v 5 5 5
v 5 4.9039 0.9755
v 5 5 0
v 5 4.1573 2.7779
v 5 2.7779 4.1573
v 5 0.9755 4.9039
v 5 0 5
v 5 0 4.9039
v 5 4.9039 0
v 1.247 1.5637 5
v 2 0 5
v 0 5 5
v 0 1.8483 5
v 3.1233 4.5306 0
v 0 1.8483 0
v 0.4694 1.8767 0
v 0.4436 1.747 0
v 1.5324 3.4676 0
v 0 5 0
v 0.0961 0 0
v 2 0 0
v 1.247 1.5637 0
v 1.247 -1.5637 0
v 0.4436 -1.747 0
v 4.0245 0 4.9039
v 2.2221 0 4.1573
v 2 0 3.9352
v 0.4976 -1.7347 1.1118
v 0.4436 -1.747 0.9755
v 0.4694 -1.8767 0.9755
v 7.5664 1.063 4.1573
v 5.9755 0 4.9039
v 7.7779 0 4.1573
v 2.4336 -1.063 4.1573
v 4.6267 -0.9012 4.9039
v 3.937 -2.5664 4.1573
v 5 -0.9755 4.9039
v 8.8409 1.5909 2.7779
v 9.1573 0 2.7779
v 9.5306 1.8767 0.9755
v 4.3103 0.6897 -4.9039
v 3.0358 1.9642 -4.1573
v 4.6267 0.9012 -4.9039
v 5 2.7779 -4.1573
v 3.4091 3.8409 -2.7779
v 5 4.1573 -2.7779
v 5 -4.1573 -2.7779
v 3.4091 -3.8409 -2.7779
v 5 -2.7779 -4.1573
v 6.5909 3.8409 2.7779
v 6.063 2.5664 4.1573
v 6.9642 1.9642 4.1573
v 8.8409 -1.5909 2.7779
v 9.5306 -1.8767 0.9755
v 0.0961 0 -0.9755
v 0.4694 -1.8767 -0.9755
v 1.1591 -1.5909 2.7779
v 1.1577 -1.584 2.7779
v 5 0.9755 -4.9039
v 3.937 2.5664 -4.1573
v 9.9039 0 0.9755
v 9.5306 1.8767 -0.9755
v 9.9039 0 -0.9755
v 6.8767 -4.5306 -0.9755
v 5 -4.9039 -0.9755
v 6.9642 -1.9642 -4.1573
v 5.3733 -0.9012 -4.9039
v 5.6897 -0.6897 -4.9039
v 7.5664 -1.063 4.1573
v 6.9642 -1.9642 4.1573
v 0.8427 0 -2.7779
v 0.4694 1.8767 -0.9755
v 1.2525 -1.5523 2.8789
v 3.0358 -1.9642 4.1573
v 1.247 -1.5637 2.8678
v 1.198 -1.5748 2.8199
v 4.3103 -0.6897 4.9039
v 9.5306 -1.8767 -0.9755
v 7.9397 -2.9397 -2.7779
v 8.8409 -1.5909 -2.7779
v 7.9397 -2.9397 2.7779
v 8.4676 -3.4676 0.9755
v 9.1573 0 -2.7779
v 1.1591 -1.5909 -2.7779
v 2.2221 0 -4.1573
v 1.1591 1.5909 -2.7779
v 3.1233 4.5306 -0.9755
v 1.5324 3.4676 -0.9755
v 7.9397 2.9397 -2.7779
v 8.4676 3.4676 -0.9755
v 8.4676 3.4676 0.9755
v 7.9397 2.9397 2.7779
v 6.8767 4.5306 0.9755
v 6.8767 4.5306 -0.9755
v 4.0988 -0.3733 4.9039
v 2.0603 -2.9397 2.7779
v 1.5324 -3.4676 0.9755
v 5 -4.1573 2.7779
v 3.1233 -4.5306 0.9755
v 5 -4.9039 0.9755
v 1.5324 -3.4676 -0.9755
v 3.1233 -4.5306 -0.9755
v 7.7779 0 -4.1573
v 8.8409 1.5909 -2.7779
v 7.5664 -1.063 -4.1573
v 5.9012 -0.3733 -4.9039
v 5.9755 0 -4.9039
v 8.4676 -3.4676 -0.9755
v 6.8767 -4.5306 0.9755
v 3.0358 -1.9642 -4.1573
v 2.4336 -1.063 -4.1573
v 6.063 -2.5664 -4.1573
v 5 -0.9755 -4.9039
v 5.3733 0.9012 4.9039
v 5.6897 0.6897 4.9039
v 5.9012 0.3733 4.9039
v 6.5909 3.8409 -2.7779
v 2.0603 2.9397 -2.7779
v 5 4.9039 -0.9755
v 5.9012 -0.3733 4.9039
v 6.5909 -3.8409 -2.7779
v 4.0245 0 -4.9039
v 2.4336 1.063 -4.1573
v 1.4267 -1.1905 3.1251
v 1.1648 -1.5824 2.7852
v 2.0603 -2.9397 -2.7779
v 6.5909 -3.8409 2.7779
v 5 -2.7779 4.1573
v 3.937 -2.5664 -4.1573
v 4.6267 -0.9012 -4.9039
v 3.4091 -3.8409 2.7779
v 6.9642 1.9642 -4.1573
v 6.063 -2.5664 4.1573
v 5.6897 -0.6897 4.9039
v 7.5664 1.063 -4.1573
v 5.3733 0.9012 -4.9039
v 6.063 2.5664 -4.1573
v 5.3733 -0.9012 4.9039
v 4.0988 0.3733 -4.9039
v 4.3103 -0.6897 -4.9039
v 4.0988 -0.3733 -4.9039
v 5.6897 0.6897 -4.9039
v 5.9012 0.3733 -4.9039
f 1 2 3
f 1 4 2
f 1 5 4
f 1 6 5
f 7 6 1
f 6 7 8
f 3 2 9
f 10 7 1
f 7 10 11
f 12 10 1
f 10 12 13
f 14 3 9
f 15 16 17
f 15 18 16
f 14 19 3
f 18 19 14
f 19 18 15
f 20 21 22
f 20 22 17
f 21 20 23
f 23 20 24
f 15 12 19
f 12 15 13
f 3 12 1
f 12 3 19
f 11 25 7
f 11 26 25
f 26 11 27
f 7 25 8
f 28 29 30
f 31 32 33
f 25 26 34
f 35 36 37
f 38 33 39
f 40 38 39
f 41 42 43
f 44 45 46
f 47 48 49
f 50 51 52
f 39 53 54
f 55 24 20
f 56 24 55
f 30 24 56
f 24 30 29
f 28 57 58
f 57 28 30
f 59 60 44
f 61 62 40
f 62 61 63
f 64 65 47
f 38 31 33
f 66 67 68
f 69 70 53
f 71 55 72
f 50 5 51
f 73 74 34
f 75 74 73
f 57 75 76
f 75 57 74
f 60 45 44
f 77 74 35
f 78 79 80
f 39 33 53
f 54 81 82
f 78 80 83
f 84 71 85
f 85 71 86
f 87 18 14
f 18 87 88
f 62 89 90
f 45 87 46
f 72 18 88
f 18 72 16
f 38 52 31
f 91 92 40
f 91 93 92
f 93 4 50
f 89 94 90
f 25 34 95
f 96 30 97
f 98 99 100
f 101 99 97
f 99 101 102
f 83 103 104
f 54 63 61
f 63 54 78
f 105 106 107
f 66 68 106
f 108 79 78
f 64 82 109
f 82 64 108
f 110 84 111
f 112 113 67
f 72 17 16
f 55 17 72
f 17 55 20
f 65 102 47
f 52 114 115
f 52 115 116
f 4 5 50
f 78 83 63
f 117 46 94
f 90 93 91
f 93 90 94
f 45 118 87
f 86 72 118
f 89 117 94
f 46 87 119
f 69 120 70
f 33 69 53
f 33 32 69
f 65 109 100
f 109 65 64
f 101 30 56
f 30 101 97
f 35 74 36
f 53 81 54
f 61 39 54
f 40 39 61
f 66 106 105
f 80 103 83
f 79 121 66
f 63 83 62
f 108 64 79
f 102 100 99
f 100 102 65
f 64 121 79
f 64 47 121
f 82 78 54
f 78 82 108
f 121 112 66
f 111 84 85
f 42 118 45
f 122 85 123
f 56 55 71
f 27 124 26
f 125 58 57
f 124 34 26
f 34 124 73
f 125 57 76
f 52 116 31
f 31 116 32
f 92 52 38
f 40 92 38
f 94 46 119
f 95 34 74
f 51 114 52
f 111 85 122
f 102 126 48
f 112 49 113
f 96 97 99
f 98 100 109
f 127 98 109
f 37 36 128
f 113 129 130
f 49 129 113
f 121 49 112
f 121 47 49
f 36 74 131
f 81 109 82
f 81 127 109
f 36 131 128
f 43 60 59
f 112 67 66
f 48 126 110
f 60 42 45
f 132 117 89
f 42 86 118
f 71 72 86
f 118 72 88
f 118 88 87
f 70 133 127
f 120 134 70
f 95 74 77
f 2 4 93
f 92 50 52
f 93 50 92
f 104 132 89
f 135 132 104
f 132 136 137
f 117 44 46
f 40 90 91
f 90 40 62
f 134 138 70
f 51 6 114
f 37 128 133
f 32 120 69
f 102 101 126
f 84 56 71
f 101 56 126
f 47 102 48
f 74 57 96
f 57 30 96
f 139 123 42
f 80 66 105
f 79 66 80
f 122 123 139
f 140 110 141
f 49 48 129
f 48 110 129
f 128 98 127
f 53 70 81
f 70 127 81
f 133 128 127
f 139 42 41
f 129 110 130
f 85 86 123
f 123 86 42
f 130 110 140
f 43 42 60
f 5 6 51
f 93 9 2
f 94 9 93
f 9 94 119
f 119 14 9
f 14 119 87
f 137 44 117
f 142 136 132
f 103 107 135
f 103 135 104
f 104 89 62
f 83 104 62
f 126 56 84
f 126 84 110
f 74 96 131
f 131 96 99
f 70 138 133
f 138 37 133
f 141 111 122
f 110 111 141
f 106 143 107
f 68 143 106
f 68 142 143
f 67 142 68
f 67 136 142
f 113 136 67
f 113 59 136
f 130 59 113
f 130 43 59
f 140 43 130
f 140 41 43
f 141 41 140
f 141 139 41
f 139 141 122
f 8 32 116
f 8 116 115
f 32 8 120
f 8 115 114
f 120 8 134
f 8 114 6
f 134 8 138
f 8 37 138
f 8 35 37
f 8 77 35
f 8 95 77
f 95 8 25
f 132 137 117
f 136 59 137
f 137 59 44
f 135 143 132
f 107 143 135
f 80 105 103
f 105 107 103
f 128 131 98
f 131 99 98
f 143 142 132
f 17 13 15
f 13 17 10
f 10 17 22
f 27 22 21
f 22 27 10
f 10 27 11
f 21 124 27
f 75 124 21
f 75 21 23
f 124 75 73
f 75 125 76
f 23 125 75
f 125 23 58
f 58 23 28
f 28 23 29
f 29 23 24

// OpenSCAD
difference() {
	union() {
		cube(size = 5);
		translate(v = [5, 0, 0]) {
			sphere(r = 5);
		}
	}
	cylinder(h = 6, r = 2);
}
